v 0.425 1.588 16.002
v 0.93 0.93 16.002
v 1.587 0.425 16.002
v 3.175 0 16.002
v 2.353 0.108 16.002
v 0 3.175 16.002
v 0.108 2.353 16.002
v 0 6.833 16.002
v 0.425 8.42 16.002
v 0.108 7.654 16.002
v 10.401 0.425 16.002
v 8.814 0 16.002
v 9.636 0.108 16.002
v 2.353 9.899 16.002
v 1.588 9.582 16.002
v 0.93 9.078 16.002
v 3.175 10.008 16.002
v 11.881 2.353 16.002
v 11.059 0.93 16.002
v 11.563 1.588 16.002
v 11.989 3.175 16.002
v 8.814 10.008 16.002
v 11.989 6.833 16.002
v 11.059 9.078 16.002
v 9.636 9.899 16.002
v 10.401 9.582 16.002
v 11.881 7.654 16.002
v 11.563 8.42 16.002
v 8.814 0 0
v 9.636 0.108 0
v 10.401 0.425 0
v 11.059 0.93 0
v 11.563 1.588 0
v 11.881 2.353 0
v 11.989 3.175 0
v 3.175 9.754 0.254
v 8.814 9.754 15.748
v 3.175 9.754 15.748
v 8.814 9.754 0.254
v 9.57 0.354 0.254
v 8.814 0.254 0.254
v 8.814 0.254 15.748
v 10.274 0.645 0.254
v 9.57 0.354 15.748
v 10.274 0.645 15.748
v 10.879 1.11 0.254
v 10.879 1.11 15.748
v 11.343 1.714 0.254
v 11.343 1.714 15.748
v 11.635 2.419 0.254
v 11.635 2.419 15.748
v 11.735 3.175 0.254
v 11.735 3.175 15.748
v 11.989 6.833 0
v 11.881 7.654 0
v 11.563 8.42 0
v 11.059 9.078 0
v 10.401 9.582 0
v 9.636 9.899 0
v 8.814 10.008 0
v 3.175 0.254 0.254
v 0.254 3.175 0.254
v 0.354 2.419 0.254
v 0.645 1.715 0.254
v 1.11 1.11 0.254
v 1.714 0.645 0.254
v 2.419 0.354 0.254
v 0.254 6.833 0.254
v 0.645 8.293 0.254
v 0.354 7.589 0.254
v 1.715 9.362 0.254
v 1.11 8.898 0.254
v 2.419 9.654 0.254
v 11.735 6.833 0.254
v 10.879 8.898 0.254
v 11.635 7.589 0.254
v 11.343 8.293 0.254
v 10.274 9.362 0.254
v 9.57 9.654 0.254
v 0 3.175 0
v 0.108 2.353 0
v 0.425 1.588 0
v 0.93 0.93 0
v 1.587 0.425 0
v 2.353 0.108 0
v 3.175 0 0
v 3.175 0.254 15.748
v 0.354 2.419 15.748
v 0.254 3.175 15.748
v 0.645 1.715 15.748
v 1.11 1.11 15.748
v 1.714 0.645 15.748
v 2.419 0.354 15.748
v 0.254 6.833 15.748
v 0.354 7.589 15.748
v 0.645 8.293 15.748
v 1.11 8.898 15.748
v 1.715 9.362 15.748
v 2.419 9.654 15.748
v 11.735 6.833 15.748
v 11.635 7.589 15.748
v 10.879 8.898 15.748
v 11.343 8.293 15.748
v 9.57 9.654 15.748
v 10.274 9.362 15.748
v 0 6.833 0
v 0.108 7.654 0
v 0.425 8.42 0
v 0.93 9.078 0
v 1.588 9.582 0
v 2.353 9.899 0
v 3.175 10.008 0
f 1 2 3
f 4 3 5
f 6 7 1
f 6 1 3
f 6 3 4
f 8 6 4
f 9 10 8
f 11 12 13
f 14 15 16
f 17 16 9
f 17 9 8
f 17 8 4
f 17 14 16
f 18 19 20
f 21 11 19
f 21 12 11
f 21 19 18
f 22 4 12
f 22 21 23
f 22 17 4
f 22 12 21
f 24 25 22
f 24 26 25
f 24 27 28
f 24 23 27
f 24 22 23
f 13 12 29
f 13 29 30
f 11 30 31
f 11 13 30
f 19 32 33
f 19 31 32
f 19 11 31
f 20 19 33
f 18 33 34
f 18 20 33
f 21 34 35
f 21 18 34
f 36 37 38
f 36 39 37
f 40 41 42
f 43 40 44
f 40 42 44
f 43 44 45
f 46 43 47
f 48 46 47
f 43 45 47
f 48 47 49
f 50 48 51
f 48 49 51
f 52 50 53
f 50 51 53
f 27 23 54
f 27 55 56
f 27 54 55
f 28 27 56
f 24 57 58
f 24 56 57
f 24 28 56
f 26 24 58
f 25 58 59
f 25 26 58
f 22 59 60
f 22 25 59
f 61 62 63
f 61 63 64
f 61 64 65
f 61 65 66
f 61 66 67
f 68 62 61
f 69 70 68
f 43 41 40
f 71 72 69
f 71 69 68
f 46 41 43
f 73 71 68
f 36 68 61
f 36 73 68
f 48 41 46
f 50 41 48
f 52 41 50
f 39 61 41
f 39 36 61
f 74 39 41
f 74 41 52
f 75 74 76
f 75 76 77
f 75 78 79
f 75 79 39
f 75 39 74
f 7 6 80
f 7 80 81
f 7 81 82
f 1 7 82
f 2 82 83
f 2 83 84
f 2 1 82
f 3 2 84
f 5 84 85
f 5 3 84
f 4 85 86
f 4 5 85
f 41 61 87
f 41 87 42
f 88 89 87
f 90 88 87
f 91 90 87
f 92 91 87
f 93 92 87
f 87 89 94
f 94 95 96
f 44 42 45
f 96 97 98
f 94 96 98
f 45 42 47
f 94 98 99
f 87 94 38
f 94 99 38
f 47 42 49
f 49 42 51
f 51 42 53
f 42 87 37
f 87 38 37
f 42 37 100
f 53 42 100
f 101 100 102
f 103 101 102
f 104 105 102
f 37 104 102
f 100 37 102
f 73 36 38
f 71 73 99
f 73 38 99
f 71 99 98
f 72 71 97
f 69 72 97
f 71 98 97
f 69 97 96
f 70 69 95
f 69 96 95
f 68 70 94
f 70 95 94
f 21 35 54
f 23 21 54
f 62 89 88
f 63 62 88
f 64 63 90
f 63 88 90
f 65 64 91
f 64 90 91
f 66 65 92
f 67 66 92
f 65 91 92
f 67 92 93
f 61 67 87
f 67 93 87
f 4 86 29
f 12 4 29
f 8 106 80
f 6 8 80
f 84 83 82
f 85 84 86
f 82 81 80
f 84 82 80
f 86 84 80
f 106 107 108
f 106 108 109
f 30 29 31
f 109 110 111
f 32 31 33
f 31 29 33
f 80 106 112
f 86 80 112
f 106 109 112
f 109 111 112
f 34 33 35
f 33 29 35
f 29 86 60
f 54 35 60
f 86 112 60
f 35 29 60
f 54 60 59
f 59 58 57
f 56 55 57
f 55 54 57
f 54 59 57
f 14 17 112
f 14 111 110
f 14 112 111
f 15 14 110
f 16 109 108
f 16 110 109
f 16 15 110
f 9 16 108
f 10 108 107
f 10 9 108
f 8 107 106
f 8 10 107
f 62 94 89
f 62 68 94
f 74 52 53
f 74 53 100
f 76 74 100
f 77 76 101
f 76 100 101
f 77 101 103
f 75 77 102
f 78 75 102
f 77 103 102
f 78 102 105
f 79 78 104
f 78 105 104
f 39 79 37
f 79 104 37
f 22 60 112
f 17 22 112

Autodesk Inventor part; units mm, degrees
ref_plane "YZ Plane" through (0, 0, 0) normal (1, 0, 0) x (0, 1, 0)
ref_plane "XZ Plane" through (0, 0, 0) normal (0, 1, 0) x (-1, 0, 0)
ref_plane "XY Plane" through (0, 0, 0) normal (0, 0, 1) x (1, 0, 0)
sketch "Sketch1" plane through (0, 0, 0) normal (0, 0, 1) x (1, 0, 0)
  line L0 (0, 0) -> (11.9888, 0)
  line L1 (11.9888, 0) -> (11.9888, 10.0076)
  line L2 (11.9888, 10.0076) -> (0, 10.0076)
  line L3 (0, 10.0076) -> (0, 0)
  dimension "d0" = 10.0076
  dimension "d1" = 11.9888
extrude "Extrusion1" add sketch "Sketch1" along normal blind 16.002
fillet "Fillet1" radius 3.175 4 edges at (11.9888, 10.0076, 8.001) (0, 10.0076, 8.001) (11.9888, 0, 8.001) (0, 0, 8.001)
shell "Shell2" thickness 0.254 removed faces 0
properties part number "Gearmotor_Motor" material "Stainless Steel"
